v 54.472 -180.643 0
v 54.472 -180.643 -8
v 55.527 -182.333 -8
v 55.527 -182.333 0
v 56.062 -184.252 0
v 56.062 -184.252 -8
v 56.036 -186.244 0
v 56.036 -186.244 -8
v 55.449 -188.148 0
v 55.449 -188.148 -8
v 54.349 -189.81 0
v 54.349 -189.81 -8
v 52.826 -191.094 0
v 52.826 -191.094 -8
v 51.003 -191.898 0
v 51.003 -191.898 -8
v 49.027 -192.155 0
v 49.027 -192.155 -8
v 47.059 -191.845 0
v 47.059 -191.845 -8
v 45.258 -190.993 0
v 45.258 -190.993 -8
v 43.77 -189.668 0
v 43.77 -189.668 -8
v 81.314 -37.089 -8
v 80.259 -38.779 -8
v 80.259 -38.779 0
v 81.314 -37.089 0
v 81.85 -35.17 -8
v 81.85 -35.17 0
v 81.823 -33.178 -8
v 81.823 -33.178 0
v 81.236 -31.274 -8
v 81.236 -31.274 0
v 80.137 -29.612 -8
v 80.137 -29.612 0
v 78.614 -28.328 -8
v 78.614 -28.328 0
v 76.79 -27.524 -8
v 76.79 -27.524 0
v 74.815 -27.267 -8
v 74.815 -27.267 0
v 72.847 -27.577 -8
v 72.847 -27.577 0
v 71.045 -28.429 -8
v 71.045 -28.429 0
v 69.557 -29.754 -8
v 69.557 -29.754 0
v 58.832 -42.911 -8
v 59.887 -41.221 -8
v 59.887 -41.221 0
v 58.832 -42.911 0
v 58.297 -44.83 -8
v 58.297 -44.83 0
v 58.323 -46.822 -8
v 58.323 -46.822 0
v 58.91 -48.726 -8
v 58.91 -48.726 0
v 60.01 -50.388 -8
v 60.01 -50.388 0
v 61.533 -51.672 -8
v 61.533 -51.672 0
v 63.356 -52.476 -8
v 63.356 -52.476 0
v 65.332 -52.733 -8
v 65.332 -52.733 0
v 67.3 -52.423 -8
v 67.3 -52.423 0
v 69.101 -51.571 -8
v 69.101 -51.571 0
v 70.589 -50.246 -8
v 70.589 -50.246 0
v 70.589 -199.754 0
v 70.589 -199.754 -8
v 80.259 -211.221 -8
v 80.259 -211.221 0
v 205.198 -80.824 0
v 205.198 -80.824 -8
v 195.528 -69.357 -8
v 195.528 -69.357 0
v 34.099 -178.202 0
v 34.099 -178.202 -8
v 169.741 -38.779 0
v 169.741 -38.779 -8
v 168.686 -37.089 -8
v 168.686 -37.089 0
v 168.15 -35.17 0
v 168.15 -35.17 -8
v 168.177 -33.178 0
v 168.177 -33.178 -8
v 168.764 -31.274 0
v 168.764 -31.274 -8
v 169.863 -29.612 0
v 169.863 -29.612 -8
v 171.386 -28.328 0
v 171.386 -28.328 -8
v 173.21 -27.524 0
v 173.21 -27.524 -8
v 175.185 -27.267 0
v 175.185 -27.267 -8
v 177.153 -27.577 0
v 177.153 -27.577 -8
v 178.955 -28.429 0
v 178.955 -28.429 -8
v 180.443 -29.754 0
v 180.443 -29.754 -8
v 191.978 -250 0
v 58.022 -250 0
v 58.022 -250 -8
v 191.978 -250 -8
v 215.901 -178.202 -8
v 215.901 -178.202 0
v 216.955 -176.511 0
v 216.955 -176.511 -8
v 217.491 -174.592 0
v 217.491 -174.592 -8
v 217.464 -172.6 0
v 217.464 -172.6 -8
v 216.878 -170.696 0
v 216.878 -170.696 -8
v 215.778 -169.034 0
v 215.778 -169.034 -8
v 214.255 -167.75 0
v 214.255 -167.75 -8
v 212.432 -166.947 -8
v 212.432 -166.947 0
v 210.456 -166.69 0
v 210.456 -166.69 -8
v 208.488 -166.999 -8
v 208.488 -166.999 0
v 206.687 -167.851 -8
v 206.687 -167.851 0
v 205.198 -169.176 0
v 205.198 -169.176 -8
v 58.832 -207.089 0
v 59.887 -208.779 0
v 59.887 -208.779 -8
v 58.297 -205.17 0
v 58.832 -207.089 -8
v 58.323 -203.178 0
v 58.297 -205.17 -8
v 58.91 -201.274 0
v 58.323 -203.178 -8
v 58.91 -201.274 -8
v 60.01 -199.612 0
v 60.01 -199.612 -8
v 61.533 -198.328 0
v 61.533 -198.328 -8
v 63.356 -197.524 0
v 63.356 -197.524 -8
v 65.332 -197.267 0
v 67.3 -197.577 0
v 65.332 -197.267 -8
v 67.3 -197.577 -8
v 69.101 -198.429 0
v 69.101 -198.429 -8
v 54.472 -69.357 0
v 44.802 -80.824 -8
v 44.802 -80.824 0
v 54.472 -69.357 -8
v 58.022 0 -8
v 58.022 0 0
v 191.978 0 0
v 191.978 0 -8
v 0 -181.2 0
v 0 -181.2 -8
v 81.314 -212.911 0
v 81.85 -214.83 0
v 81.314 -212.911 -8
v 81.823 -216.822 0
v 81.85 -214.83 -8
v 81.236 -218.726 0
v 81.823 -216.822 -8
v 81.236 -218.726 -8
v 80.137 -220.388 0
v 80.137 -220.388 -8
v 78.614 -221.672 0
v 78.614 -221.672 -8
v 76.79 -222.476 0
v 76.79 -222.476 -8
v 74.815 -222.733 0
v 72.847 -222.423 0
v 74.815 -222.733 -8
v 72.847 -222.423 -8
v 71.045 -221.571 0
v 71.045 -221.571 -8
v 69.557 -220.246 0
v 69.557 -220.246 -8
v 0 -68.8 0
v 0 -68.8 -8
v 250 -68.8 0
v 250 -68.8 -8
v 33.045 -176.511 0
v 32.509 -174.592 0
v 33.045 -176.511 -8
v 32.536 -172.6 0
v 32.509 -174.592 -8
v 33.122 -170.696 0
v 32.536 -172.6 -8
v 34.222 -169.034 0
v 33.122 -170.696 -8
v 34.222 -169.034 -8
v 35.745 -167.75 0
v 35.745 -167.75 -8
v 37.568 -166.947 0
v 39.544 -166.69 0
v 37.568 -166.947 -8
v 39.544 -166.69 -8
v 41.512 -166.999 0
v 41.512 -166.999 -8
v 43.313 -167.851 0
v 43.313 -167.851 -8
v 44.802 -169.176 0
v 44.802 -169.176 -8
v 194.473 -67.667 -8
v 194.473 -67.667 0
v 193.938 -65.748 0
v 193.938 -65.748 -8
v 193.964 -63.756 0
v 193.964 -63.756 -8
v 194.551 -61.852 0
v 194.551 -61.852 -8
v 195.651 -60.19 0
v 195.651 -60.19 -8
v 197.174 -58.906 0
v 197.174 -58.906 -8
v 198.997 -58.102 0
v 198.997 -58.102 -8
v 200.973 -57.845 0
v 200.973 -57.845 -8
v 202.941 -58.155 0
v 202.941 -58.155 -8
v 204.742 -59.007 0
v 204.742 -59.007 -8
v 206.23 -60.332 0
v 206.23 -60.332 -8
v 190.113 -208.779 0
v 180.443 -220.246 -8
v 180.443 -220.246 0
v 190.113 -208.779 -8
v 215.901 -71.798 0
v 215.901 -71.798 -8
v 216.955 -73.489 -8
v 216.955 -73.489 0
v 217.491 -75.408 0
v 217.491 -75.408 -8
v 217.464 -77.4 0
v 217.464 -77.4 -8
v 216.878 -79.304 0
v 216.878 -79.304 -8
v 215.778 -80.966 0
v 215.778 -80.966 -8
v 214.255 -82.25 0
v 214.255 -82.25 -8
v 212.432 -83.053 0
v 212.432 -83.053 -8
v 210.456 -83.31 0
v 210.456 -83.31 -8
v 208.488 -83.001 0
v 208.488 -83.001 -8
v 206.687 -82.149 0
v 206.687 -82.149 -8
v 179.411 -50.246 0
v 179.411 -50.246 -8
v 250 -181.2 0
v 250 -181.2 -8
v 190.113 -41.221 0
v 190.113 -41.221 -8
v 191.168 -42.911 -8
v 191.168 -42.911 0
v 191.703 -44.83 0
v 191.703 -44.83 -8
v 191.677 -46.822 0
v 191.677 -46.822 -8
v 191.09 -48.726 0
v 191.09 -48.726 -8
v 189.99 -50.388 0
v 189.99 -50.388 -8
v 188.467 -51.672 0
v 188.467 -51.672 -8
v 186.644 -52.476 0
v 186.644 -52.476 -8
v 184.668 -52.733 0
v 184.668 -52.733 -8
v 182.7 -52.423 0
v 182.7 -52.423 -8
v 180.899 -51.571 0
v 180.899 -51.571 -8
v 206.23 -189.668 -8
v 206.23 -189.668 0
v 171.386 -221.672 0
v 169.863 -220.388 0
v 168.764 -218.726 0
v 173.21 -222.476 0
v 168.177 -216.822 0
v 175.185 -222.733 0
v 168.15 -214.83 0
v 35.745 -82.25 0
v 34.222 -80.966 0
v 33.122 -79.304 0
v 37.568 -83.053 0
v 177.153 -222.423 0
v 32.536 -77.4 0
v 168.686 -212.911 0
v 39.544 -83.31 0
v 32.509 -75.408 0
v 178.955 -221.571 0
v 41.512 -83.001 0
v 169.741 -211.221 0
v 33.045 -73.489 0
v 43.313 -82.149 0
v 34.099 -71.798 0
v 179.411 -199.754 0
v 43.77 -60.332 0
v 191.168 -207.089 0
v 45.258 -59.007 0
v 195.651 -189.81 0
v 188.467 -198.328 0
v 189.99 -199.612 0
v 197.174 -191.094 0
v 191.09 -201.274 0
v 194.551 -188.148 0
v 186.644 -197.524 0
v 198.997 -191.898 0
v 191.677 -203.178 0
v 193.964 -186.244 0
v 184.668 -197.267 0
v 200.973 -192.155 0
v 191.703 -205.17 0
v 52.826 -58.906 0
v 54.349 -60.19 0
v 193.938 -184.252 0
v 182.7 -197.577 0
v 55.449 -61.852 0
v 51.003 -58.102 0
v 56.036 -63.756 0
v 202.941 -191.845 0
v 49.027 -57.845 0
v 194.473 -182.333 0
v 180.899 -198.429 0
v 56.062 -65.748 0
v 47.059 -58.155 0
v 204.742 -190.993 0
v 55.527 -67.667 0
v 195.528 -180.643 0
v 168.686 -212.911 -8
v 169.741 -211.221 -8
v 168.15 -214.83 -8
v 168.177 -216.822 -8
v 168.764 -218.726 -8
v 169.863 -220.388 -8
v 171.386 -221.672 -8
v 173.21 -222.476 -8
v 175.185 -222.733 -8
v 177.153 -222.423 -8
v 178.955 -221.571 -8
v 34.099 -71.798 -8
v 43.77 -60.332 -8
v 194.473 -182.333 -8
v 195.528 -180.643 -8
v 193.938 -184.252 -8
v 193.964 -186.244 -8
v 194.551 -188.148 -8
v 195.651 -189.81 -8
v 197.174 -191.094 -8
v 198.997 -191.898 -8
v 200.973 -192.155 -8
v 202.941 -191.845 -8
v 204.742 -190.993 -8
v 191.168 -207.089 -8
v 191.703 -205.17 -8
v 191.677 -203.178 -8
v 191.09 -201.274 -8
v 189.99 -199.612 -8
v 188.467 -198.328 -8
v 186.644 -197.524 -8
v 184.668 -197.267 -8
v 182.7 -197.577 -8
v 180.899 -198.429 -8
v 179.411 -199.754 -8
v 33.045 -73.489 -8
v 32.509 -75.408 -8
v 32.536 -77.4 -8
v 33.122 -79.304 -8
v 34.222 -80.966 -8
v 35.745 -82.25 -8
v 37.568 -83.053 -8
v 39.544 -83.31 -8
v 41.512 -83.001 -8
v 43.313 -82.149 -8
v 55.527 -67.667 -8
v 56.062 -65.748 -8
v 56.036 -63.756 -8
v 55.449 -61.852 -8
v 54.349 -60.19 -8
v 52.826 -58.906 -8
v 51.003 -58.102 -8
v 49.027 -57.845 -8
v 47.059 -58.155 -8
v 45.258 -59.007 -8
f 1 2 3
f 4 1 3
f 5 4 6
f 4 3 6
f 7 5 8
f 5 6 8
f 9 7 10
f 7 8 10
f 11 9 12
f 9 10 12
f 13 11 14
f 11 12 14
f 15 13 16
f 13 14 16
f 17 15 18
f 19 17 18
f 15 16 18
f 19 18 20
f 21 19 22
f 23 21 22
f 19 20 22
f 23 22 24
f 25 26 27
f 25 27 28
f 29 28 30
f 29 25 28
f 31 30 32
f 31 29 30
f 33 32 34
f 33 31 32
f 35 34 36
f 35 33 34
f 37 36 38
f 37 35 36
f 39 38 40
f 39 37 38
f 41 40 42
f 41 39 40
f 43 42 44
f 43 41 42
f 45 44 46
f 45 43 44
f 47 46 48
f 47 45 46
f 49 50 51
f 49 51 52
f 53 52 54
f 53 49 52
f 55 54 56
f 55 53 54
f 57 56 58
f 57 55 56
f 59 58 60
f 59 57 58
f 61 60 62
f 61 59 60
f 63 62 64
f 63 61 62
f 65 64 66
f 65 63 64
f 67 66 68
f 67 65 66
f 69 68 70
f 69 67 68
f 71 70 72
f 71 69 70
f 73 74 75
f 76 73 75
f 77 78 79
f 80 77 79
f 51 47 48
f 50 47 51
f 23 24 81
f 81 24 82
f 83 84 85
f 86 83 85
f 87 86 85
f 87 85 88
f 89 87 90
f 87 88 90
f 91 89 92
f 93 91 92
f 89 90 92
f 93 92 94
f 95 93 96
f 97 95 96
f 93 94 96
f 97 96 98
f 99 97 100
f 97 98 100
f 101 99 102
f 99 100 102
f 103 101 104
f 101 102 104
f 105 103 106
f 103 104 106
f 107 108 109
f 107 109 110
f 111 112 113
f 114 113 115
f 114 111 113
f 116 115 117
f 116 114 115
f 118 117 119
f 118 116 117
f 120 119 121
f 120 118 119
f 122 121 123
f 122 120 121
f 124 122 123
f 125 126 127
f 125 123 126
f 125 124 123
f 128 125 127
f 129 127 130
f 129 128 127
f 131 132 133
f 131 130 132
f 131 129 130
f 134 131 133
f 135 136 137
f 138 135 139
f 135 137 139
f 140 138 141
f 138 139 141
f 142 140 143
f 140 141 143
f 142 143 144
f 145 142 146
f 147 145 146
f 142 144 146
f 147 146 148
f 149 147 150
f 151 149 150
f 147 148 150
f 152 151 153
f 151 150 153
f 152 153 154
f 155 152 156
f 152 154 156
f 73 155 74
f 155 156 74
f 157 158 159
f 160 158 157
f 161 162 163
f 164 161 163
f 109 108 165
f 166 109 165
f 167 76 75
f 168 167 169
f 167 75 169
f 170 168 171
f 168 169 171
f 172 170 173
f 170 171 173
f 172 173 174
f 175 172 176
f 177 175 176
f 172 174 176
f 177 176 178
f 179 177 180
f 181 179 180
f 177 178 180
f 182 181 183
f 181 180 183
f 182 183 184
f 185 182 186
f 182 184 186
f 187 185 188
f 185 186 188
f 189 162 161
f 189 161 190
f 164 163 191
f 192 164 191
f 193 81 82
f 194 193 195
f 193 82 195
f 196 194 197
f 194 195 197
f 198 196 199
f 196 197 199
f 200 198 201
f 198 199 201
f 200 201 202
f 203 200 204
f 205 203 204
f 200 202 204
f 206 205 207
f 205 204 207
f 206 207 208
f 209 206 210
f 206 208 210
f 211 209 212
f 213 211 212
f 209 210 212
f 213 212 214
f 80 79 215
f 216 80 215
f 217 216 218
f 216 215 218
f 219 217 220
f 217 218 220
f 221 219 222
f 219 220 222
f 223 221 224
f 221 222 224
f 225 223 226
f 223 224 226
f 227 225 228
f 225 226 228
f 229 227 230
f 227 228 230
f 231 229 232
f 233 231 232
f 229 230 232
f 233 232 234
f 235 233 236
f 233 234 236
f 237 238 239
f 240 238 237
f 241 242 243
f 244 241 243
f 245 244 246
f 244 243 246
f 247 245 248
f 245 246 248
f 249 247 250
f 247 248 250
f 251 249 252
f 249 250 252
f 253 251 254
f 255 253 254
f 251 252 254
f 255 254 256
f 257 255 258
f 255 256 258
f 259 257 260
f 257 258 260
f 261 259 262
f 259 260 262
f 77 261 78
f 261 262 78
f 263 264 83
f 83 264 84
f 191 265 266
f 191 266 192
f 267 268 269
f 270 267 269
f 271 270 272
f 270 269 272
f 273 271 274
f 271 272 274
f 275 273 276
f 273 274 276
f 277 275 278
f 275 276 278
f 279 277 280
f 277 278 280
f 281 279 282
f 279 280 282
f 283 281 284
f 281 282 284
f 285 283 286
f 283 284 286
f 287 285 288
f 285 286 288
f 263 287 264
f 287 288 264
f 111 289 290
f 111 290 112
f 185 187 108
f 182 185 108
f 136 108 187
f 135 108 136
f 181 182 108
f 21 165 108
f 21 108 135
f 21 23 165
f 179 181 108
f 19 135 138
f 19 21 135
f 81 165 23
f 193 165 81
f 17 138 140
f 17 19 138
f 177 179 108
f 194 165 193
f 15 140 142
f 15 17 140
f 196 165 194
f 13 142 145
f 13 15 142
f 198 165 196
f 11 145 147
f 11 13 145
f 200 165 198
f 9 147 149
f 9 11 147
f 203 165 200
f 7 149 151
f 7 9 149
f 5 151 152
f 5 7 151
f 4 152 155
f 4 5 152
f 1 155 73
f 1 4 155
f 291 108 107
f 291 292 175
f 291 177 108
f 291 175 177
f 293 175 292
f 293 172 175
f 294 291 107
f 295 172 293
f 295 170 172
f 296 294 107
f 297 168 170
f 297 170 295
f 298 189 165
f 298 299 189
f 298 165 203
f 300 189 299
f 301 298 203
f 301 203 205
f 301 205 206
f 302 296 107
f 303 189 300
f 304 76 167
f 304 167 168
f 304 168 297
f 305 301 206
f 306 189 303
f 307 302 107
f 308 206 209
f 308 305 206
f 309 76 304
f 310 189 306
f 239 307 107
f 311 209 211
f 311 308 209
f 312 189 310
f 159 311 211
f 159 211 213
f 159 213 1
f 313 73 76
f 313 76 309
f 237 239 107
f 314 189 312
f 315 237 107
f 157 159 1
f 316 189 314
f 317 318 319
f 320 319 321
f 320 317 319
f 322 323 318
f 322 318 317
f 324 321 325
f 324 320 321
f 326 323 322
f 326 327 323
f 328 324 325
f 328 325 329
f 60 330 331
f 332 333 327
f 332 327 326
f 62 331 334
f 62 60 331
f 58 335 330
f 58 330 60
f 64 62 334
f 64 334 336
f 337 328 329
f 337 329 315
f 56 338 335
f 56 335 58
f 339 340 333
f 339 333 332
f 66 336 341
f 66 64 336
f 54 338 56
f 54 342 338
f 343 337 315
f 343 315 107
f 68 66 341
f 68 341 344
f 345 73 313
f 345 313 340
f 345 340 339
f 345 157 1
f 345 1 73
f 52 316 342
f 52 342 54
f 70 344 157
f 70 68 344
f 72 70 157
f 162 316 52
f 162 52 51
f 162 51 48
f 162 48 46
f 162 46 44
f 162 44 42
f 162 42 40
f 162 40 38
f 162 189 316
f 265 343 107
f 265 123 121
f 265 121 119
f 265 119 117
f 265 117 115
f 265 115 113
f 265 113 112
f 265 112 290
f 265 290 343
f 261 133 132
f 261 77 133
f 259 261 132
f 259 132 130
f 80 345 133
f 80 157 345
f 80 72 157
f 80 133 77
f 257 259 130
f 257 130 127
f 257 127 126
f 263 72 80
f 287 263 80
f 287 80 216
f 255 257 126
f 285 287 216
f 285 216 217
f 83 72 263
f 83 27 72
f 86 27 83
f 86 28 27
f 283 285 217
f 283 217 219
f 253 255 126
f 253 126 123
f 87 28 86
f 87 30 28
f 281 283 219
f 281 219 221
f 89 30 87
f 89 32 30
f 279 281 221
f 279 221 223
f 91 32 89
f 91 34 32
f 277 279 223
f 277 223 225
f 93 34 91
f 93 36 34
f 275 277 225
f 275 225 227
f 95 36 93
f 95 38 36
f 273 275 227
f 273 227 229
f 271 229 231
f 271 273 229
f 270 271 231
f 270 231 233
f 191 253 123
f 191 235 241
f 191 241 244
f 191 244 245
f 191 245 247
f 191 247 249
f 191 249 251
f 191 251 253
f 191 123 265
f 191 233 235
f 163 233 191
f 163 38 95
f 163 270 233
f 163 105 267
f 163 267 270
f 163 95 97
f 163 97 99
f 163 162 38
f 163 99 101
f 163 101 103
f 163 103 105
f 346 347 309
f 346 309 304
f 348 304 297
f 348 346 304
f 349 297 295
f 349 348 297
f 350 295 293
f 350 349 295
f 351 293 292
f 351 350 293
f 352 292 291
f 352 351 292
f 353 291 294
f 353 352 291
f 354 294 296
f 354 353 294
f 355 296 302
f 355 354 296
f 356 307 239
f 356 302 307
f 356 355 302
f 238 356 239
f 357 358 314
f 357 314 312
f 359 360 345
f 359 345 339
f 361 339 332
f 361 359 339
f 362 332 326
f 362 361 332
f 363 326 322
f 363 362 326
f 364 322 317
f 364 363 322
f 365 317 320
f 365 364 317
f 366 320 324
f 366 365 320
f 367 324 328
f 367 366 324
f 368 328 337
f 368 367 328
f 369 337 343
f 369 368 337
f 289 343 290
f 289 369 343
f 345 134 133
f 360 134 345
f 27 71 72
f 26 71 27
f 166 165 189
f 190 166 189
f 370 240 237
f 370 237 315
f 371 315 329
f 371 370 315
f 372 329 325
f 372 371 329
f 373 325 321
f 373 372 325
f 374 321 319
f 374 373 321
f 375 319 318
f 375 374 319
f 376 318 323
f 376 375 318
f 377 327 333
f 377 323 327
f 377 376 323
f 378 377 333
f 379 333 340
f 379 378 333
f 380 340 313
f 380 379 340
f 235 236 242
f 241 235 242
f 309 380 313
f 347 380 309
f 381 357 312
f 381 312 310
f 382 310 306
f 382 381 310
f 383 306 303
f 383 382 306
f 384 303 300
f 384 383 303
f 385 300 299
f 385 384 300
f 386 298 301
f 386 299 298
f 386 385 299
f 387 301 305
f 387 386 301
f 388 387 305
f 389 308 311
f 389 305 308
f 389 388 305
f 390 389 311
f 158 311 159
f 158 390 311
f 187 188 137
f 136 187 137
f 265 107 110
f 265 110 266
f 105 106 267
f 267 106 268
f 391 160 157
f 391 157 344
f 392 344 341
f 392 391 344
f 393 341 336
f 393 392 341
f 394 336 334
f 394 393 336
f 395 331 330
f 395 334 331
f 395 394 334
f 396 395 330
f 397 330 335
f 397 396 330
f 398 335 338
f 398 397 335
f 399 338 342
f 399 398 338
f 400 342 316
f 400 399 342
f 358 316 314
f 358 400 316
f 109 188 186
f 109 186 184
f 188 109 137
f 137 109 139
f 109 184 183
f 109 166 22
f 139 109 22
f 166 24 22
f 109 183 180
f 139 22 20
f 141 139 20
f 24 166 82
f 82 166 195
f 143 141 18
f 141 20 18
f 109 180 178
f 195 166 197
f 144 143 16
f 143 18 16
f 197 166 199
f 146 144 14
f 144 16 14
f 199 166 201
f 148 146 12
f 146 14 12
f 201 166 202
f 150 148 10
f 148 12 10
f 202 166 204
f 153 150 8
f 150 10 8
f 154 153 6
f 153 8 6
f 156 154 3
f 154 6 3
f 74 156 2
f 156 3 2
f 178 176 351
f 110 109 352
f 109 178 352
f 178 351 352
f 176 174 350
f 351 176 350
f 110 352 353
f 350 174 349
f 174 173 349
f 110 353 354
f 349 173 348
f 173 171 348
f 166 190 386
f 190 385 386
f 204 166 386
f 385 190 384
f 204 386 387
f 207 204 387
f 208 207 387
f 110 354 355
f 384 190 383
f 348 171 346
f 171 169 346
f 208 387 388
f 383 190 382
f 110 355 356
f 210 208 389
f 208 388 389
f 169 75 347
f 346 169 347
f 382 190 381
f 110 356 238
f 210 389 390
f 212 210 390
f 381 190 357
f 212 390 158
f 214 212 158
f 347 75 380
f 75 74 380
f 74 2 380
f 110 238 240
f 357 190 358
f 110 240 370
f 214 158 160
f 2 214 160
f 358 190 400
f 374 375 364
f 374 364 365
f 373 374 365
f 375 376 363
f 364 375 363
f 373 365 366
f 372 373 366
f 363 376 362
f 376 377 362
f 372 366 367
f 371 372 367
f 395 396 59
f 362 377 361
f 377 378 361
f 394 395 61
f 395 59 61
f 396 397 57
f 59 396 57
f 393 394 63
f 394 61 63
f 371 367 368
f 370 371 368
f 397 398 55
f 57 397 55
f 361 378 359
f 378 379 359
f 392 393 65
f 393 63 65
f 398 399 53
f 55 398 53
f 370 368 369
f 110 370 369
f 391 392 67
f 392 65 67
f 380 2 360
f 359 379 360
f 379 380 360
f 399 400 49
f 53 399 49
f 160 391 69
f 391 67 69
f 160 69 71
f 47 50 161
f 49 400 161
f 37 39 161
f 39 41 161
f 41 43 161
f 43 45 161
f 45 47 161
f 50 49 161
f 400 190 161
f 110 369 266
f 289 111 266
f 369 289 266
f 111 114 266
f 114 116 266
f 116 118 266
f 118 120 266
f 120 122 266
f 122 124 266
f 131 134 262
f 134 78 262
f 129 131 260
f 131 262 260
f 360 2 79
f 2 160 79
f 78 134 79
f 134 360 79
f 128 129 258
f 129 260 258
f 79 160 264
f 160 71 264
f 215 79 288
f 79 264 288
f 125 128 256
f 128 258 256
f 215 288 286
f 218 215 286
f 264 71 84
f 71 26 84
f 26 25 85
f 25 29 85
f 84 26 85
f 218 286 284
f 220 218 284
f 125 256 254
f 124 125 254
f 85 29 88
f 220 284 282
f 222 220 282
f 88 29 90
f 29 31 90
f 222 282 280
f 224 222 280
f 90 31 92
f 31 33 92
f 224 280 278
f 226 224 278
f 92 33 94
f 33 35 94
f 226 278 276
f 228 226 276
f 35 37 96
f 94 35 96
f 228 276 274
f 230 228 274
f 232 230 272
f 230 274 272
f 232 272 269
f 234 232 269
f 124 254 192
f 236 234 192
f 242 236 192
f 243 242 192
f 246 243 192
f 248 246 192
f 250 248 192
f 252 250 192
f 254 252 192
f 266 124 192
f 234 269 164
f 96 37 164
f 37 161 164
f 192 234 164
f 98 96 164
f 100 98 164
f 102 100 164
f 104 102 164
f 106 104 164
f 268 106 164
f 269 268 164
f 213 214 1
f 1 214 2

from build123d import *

# Parameters (mm, degrees)
SKETCH_1_W             = 250
SKETCH_1_H             = 250
SM_BASE_FLANGE_1_DEPTH = 8
CUT_EXTRUDE_1_DEPTH    = 10
CUT_EXTRUDE_2_DEPTH    = 10


# Sheet-metal steps are written as plain solids
with BuildPart() as part:
    # Sketch 1 → Базовая кромка1 (new body)
    with BuildSketch(Plane.XY):
        with Locations((125, -125)):
            Rectangle(SKETCH_1_W, SKETCH_1_H)
    extrude(amount=-SM_BASE_FLANGE_1_DEPTH)

    # Sketch 2 → Вырез-Вытянуть1 (cut)
    with BuildSketch(Plane.XY):
        Polygon((58.022064768, 0), (0, -68.8), (0, 0), align=None)
        Polygon((250, 0), (191.977935232, 0), (250, -68.8), align=None)
        Polygon((191.977935232, -250), (250, -181.2), (250, -250), align=None)
        Polygon((0, -250), (58.022064768, -250), (0, -181.2), align=None)
    extrude(amount=-CUT_EXTRUDE_1_DEPTH, mode=Mode.SUBTRACT)

    # Эскиз3 → Вырез-Вытянуть2 (cut)
    with BuildSketch(Plane(origin=(0, 0, -8), x_dir=(-1, 0, 0), z_dir=(0, 0, -1))):
        with BuildLine():
            Line((-69.557250856, -29.753839407), (-59.886906728, -41.220506074))
            ThreePointArc((-59.886906728, -41.220506074), (-60.725190579, -51.084444444), (-70.58912895, -50.246160593))
            Line((-70.58912895, -50.246160593), (-80.259473078, -38.779493926))
            ThreePointArc((-80.259473078, -38.779493926), (-79.421189227, -28.915555556), (-69.557250856, -29.753839407))
        make_face()
        with BuildLine():
            Line((-43.769666514, -60.331617185), (-34.099322386, -71.798283851))
            ThreePointArc((-34.099322386, -71.798283851), (-34.937606238, -81.662222222), (-44.801544609, -80.823938371))
            Line((-44.801544609, -80.823938371), (-54.471888737, -69.357271704))
            ThreePointArc((-54.471888737, -69.357271704), (-53.633604885, -59.493333333), (-43.769666514, -60.331617185))
        make_face()
        with BuildLine():
            Line((-180.442749144, -29.753839407), (-190.113093272, -41.220506074))
            ThreePointArc((-190.113093272, -41.220506074), (-189.274809421, -51.084444444), (-179.41087105, -50.246160593))
            Line((-179.41087105, -50.246160593), (-169.740526922, -38.779493926))
            ThreePointArc((-169.740526922, -38.779493926), (-170.578810773, -28.915555556), (-180.442749144, -29.753839407))
        make_face()
        with BuildLine():
            Line((-206.230333486, -60.331617185), (-215.900677614, -71.798283851))
            ThreePointArc((-215.900677614, -71.798283851), (-215.062393762, -81.662222222), (-205.198455391, -80.823938371))
            Line((-205.198455391, -80.823938371), (-195.528111263, -69.357271704))
            ThreePointArc((-195.528111263, -69.357271704), (-196.366395115, -59.493333333), (-206.230333486, -60.331617185))
        make_face()
        with BuildLine():
            Line((-69.557250856, -220.246160593), (-59.886906728, -208.779493926))
            ThreePointArc((-59.886906728, -208.779493926), (-60.725190579, -198.915555556), (-70.58912895, -199.753839407))
            Line((-70.58912895, -199.753839407), (-80.259473078, -211.220506074))
            ThreePointArc((-80.259473078, -211.220506074), (-79.421189227, -221.084444444), (-69.557250856, -220.246160593))
        make_face()
        with BuildLine():
            Line((-43.769666514, -189.668382815), (-34.099322386, -178.201716149))
            ThreePointArc((-34.099322386, -178.201716149), (-34.937606238, -168.337777778), (-44.801544609, -169.176061629))
            Line((-44.801544609, -169.176061629), (-54.471888737, -180.642728296))
            ThreePointArc((-54.471888737, -180.642728296), (-53.633604885, -190.506666667), (-43.769666514, -189.668382815))
        make_face()
        with BuildLine():
            Line((-180.442749144, -220.246160593), (-190.113093272, -208.779493926))
            ThreePointArc((-190.113093272, -208.779493926), (-189.274809421, -198.915555556), (-179.41087105, -199.753839407))
            Line((-179.41087105, -199.753839407), (-169.740526922, -211.220506074))
            ThreePointArc((-169.740526922, -211.220506074), (-170.578810773, -221.084444444), (-180.442749144, -220.246160593))
        make_face()
        with BuildLine():
            Line((-206.230333486, -189.668382815), (-215.900677614, -178.201716149))
            ThreePointArc((-215.900677614, -178.201716149), (-215.062393762, -168.337777778), (-205.198455391, -169.176061629))
            Line((-205.198455391, -169.176061629), (-195.528111263, -180.642728296))
            ThreePointArc((-195.528111263, -180.642728296), (-196.366395115, -190.506666667), (-206.230333486, -189.668382815))
        make_face()
    extrude(amount=-CUT_EXTRUDE_2_DEPTH, mode=Mode.SUBTRACT)


solid = part.part
